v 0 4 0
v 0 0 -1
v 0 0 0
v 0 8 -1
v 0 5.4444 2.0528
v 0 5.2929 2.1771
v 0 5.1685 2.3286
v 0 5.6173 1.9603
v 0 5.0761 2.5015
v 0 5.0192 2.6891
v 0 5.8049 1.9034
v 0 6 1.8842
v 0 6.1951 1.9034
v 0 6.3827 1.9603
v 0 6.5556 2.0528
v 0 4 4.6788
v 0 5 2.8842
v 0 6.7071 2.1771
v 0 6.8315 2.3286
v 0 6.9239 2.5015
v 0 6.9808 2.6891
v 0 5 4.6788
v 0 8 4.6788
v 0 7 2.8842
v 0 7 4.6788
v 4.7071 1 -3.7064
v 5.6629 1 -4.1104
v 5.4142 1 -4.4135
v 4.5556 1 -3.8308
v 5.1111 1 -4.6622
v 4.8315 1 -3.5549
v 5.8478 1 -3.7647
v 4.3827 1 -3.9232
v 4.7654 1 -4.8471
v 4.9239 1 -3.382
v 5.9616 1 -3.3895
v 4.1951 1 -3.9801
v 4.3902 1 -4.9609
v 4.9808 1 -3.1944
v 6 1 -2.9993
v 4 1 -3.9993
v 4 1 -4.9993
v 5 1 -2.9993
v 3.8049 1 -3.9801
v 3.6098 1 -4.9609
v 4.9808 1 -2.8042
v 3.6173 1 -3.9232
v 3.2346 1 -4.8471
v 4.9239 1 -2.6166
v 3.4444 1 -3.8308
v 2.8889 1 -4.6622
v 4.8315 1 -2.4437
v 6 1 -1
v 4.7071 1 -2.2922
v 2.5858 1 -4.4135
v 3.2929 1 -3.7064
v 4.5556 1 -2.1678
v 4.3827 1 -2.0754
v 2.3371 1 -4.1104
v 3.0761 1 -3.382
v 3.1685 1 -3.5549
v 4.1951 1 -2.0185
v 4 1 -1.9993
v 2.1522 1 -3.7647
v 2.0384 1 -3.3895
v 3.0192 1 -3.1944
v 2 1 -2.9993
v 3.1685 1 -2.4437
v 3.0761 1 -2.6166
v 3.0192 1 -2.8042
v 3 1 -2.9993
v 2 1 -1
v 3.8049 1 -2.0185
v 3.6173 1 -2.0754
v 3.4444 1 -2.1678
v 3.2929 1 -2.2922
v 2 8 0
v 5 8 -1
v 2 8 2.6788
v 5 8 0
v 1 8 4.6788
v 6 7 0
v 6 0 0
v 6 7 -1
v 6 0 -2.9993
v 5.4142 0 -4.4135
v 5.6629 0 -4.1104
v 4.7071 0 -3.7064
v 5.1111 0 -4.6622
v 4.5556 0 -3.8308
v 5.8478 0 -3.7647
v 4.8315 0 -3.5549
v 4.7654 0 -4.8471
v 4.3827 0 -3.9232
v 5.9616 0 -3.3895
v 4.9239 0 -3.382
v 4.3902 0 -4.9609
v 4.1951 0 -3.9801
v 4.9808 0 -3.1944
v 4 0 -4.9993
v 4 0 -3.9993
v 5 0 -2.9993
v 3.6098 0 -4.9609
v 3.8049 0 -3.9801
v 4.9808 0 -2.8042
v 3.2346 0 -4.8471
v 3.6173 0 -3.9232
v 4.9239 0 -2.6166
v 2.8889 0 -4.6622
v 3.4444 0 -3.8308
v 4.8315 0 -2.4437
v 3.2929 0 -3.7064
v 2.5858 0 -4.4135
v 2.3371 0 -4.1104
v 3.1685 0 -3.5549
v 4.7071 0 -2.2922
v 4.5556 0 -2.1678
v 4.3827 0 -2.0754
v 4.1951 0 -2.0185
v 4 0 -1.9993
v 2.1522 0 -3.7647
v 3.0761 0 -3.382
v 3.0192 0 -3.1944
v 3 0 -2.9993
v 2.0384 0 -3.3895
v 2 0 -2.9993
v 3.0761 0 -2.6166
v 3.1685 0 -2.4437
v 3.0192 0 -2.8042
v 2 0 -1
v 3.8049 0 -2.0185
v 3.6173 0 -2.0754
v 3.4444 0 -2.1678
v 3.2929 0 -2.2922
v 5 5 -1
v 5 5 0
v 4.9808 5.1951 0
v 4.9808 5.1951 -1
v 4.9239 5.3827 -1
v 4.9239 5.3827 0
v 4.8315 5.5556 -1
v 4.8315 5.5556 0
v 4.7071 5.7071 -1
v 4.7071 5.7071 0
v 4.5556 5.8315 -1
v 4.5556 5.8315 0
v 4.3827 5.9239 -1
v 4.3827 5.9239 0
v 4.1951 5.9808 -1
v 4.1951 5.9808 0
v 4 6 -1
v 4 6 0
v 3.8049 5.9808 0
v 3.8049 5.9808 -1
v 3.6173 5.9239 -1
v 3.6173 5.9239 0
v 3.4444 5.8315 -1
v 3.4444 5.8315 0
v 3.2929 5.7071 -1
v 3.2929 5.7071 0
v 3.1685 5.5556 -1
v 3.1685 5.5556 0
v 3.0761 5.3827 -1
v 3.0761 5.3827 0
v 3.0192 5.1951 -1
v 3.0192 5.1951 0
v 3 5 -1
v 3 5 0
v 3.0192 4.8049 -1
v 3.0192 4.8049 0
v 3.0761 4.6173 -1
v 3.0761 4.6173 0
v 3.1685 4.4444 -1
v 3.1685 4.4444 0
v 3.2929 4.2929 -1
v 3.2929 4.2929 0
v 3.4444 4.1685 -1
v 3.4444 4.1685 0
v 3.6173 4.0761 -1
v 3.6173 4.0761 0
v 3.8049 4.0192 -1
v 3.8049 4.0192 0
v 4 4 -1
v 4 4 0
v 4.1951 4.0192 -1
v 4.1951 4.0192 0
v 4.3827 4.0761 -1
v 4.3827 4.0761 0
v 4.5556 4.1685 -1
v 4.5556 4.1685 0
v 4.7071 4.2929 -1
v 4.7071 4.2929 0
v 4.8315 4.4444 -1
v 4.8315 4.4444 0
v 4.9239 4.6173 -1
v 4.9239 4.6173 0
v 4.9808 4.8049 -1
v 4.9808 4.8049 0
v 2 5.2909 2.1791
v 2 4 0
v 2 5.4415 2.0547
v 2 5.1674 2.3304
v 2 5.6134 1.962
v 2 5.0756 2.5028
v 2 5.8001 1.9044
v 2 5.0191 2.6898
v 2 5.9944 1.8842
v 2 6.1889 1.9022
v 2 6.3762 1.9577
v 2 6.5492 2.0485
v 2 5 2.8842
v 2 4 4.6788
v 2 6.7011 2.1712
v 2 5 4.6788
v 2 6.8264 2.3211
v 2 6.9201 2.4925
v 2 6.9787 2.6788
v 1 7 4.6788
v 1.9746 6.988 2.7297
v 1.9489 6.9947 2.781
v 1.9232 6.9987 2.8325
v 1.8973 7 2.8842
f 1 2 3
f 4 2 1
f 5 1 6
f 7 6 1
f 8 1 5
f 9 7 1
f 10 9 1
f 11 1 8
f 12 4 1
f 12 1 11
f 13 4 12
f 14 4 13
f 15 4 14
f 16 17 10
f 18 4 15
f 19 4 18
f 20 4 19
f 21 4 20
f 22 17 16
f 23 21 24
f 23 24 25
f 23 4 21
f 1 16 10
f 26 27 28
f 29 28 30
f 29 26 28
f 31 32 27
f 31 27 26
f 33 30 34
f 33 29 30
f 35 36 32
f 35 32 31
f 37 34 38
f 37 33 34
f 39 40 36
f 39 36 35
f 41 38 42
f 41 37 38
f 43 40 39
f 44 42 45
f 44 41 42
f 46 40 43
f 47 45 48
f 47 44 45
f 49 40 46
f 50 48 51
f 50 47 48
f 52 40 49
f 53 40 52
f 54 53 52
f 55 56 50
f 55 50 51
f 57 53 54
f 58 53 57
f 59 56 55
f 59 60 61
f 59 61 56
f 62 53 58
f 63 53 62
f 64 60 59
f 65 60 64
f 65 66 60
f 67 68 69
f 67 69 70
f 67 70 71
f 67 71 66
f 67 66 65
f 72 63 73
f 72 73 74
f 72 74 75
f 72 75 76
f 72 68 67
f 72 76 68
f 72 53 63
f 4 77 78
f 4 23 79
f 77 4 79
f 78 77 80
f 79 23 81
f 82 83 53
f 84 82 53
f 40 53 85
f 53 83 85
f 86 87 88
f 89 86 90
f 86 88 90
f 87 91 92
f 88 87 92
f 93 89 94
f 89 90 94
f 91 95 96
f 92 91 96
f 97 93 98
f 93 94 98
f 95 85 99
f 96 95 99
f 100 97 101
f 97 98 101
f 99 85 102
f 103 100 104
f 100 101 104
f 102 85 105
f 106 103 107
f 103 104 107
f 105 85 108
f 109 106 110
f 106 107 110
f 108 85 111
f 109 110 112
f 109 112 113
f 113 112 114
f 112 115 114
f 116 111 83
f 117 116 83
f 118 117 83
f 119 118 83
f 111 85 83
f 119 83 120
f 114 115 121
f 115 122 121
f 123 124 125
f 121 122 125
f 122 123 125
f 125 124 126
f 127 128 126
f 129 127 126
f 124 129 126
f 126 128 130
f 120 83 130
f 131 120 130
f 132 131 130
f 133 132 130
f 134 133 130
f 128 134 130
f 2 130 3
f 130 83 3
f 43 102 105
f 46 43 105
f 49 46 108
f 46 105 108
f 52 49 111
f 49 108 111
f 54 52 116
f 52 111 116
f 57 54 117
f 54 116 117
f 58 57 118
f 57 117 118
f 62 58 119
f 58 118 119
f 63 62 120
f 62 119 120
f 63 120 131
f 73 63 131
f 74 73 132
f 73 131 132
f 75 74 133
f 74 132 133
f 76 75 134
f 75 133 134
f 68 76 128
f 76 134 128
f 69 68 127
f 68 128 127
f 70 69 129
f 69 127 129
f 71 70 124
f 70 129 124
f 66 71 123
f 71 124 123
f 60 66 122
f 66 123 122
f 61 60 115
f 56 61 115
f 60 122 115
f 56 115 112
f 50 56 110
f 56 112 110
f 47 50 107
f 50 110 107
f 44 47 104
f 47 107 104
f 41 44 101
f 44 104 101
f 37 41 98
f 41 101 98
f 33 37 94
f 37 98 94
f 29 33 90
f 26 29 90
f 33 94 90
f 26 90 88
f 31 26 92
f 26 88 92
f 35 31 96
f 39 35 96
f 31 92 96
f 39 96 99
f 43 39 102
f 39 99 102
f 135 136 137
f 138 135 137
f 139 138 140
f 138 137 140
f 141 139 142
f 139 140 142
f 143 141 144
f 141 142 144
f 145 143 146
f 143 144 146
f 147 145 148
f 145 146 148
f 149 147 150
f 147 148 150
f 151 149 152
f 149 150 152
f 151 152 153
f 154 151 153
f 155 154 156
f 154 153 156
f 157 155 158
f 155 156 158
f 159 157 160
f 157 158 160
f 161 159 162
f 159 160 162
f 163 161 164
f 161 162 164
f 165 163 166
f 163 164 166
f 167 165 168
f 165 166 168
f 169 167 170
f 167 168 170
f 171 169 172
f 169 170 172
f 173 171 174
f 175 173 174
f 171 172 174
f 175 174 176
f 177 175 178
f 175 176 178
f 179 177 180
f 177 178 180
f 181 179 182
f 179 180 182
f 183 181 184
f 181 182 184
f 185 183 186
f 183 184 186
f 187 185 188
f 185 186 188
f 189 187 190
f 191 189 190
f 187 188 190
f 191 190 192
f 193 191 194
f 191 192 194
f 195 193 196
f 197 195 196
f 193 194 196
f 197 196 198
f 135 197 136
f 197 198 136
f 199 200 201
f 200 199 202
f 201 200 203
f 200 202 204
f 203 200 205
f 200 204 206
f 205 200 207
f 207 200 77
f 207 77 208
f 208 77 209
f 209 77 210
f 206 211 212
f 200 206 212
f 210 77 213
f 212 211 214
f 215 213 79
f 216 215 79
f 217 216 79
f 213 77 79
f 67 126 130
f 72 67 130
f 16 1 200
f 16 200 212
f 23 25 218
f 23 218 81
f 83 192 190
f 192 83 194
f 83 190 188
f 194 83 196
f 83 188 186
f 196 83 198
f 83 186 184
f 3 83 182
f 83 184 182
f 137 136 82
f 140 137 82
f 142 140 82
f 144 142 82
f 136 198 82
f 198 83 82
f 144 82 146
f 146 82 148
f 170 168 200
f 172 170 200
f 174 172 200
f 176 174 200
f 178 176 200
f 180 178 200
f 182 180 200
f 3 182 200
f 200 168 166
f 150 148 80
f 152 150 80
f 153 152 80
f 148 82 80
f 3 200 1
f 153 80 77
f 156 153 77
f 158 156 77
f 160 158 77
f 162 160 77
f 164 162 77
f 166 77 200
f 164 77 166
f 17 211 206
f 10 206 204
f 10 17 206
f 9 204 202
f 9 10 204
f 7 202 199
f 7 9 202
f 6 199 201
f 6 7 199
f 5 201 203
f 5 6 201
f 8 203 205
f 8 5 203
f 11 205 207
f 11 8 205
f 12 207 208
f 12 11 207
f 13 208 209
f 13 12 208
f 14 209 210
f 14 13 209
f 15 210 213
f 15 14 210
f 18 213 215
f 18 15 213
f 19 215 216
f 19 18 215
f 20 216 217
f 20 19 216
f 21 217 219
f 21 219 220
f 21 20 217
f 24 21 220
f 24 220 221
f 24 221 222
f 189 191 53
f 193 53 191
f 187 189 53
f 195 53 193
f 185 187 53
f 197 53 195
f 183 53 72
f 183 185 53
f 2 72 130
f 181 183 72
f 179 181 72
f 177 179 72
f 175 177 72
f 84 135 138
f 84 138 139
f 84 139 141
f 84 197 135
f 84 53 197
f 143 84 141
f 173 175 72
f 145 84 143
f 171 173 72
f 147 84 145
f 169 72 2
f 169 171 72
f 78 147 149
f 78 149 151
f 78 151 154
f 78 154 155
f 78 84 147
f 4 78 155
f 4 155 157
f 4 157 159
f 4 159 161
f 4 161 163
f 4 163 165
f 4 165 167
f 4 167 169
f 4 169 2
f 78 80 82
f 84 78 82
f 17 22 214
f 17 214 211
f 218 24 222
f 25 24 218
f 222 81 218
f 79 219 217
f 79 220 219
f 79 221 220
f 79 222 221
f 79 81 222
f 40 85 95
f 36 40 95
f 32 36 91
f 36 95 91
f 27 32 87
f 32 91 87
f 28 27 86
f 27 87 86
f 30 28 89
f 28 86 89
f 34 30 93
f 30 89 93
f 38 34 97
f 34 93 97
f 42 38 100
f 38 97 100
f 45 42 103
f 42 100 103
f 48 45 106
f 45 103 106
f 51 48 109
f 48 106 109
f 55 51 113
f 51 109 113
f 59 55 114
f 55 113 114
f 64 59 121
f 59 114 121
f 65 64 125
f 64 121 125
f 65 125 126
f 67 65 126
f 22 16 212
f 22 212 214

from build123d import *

# Parameters (mm, degrees)
SKETCH1_R           = 1
BOSS_EXTRUDE1_DEPTH = 1
SKETCH2_R           = 1
BOSS_EXTRUDE2_DEPTH = 1
BOSS_EXTRUDE3_DEPTH = 2
CUT_EXTRUDE1_DEPTH  = 2


with BuildPart() as part:
    # Sketch1 → Boss-Extrude1 (new body)
    with BuildSketch(Plane.XY):
        Polygon((5, 8), (6, 7), (6, 0), (0, 0), (0, 8), align=None)
        with Locations((4, 5)):
            Circle(SKETCH1_R, mode=Mode.SUBTRACT)
    extrude(amount=-BOSS_EXTRUDE1_DEPTH)

    # Sketch2 → Boss-Extrude2 (add)
    with BuildSketch(Plane.XZ):
        with BuildLine():
            Line((6, -1), (6, -2.999291988))
            ThreePointArc((6, -2.999291988), (4, -4.999291988), (2, -2.999291988))
            Line((2, -2.999291988), (2, -1))
            Line((2, -1), (6, -1))
        make_face()
        with Locations((4, -2.999291988)):
            Circle(SKETCH2_R, mode=Mode.SUBTRACT)
    extrude(amount=-BOSS_EXTRUDE2_DEPTH)

    # Sketch3 → Boss-Extrude3 (add)
    with BuildSketch(Plane.ZY):
        with BuildLine():
            Line((0, 8), (0, 4))
            Line((0, 4), (4.678841552, 4))
            Line((4.678841552, 4), (4.678841552, 5))
            Line((4.678841552, 5), (2.884219665, 5))
            ThreePointArc((2.884219665, 5), (1.884219665, 6), (2.884219665, 7))
            Line((2.884219665, 7), (4.678841552, 7))
            Line((4.678841552, 7), (4.678841552, 8))
            Line((4.678841552, 8), (0, 8))
        make_face()
    extrude(amount=-BOSS_EXTRUDE3_DEPTH)

    # Sketch4 → Cut-Extrude1 (cut)
    with BuildSketch(Plane(origin=(0, 8, 0), x_dir=(1, 0, 0), z_dir=(0, 1, 0))):
        Polygon((1, -4.678841552), (2, -2.678841552), (2, -4.678841552), align=None)
    extrude(amount=-CUT_EXTRUDE1_DEPTH, mode=Mode.SUBTRACT)


solid = part.part
